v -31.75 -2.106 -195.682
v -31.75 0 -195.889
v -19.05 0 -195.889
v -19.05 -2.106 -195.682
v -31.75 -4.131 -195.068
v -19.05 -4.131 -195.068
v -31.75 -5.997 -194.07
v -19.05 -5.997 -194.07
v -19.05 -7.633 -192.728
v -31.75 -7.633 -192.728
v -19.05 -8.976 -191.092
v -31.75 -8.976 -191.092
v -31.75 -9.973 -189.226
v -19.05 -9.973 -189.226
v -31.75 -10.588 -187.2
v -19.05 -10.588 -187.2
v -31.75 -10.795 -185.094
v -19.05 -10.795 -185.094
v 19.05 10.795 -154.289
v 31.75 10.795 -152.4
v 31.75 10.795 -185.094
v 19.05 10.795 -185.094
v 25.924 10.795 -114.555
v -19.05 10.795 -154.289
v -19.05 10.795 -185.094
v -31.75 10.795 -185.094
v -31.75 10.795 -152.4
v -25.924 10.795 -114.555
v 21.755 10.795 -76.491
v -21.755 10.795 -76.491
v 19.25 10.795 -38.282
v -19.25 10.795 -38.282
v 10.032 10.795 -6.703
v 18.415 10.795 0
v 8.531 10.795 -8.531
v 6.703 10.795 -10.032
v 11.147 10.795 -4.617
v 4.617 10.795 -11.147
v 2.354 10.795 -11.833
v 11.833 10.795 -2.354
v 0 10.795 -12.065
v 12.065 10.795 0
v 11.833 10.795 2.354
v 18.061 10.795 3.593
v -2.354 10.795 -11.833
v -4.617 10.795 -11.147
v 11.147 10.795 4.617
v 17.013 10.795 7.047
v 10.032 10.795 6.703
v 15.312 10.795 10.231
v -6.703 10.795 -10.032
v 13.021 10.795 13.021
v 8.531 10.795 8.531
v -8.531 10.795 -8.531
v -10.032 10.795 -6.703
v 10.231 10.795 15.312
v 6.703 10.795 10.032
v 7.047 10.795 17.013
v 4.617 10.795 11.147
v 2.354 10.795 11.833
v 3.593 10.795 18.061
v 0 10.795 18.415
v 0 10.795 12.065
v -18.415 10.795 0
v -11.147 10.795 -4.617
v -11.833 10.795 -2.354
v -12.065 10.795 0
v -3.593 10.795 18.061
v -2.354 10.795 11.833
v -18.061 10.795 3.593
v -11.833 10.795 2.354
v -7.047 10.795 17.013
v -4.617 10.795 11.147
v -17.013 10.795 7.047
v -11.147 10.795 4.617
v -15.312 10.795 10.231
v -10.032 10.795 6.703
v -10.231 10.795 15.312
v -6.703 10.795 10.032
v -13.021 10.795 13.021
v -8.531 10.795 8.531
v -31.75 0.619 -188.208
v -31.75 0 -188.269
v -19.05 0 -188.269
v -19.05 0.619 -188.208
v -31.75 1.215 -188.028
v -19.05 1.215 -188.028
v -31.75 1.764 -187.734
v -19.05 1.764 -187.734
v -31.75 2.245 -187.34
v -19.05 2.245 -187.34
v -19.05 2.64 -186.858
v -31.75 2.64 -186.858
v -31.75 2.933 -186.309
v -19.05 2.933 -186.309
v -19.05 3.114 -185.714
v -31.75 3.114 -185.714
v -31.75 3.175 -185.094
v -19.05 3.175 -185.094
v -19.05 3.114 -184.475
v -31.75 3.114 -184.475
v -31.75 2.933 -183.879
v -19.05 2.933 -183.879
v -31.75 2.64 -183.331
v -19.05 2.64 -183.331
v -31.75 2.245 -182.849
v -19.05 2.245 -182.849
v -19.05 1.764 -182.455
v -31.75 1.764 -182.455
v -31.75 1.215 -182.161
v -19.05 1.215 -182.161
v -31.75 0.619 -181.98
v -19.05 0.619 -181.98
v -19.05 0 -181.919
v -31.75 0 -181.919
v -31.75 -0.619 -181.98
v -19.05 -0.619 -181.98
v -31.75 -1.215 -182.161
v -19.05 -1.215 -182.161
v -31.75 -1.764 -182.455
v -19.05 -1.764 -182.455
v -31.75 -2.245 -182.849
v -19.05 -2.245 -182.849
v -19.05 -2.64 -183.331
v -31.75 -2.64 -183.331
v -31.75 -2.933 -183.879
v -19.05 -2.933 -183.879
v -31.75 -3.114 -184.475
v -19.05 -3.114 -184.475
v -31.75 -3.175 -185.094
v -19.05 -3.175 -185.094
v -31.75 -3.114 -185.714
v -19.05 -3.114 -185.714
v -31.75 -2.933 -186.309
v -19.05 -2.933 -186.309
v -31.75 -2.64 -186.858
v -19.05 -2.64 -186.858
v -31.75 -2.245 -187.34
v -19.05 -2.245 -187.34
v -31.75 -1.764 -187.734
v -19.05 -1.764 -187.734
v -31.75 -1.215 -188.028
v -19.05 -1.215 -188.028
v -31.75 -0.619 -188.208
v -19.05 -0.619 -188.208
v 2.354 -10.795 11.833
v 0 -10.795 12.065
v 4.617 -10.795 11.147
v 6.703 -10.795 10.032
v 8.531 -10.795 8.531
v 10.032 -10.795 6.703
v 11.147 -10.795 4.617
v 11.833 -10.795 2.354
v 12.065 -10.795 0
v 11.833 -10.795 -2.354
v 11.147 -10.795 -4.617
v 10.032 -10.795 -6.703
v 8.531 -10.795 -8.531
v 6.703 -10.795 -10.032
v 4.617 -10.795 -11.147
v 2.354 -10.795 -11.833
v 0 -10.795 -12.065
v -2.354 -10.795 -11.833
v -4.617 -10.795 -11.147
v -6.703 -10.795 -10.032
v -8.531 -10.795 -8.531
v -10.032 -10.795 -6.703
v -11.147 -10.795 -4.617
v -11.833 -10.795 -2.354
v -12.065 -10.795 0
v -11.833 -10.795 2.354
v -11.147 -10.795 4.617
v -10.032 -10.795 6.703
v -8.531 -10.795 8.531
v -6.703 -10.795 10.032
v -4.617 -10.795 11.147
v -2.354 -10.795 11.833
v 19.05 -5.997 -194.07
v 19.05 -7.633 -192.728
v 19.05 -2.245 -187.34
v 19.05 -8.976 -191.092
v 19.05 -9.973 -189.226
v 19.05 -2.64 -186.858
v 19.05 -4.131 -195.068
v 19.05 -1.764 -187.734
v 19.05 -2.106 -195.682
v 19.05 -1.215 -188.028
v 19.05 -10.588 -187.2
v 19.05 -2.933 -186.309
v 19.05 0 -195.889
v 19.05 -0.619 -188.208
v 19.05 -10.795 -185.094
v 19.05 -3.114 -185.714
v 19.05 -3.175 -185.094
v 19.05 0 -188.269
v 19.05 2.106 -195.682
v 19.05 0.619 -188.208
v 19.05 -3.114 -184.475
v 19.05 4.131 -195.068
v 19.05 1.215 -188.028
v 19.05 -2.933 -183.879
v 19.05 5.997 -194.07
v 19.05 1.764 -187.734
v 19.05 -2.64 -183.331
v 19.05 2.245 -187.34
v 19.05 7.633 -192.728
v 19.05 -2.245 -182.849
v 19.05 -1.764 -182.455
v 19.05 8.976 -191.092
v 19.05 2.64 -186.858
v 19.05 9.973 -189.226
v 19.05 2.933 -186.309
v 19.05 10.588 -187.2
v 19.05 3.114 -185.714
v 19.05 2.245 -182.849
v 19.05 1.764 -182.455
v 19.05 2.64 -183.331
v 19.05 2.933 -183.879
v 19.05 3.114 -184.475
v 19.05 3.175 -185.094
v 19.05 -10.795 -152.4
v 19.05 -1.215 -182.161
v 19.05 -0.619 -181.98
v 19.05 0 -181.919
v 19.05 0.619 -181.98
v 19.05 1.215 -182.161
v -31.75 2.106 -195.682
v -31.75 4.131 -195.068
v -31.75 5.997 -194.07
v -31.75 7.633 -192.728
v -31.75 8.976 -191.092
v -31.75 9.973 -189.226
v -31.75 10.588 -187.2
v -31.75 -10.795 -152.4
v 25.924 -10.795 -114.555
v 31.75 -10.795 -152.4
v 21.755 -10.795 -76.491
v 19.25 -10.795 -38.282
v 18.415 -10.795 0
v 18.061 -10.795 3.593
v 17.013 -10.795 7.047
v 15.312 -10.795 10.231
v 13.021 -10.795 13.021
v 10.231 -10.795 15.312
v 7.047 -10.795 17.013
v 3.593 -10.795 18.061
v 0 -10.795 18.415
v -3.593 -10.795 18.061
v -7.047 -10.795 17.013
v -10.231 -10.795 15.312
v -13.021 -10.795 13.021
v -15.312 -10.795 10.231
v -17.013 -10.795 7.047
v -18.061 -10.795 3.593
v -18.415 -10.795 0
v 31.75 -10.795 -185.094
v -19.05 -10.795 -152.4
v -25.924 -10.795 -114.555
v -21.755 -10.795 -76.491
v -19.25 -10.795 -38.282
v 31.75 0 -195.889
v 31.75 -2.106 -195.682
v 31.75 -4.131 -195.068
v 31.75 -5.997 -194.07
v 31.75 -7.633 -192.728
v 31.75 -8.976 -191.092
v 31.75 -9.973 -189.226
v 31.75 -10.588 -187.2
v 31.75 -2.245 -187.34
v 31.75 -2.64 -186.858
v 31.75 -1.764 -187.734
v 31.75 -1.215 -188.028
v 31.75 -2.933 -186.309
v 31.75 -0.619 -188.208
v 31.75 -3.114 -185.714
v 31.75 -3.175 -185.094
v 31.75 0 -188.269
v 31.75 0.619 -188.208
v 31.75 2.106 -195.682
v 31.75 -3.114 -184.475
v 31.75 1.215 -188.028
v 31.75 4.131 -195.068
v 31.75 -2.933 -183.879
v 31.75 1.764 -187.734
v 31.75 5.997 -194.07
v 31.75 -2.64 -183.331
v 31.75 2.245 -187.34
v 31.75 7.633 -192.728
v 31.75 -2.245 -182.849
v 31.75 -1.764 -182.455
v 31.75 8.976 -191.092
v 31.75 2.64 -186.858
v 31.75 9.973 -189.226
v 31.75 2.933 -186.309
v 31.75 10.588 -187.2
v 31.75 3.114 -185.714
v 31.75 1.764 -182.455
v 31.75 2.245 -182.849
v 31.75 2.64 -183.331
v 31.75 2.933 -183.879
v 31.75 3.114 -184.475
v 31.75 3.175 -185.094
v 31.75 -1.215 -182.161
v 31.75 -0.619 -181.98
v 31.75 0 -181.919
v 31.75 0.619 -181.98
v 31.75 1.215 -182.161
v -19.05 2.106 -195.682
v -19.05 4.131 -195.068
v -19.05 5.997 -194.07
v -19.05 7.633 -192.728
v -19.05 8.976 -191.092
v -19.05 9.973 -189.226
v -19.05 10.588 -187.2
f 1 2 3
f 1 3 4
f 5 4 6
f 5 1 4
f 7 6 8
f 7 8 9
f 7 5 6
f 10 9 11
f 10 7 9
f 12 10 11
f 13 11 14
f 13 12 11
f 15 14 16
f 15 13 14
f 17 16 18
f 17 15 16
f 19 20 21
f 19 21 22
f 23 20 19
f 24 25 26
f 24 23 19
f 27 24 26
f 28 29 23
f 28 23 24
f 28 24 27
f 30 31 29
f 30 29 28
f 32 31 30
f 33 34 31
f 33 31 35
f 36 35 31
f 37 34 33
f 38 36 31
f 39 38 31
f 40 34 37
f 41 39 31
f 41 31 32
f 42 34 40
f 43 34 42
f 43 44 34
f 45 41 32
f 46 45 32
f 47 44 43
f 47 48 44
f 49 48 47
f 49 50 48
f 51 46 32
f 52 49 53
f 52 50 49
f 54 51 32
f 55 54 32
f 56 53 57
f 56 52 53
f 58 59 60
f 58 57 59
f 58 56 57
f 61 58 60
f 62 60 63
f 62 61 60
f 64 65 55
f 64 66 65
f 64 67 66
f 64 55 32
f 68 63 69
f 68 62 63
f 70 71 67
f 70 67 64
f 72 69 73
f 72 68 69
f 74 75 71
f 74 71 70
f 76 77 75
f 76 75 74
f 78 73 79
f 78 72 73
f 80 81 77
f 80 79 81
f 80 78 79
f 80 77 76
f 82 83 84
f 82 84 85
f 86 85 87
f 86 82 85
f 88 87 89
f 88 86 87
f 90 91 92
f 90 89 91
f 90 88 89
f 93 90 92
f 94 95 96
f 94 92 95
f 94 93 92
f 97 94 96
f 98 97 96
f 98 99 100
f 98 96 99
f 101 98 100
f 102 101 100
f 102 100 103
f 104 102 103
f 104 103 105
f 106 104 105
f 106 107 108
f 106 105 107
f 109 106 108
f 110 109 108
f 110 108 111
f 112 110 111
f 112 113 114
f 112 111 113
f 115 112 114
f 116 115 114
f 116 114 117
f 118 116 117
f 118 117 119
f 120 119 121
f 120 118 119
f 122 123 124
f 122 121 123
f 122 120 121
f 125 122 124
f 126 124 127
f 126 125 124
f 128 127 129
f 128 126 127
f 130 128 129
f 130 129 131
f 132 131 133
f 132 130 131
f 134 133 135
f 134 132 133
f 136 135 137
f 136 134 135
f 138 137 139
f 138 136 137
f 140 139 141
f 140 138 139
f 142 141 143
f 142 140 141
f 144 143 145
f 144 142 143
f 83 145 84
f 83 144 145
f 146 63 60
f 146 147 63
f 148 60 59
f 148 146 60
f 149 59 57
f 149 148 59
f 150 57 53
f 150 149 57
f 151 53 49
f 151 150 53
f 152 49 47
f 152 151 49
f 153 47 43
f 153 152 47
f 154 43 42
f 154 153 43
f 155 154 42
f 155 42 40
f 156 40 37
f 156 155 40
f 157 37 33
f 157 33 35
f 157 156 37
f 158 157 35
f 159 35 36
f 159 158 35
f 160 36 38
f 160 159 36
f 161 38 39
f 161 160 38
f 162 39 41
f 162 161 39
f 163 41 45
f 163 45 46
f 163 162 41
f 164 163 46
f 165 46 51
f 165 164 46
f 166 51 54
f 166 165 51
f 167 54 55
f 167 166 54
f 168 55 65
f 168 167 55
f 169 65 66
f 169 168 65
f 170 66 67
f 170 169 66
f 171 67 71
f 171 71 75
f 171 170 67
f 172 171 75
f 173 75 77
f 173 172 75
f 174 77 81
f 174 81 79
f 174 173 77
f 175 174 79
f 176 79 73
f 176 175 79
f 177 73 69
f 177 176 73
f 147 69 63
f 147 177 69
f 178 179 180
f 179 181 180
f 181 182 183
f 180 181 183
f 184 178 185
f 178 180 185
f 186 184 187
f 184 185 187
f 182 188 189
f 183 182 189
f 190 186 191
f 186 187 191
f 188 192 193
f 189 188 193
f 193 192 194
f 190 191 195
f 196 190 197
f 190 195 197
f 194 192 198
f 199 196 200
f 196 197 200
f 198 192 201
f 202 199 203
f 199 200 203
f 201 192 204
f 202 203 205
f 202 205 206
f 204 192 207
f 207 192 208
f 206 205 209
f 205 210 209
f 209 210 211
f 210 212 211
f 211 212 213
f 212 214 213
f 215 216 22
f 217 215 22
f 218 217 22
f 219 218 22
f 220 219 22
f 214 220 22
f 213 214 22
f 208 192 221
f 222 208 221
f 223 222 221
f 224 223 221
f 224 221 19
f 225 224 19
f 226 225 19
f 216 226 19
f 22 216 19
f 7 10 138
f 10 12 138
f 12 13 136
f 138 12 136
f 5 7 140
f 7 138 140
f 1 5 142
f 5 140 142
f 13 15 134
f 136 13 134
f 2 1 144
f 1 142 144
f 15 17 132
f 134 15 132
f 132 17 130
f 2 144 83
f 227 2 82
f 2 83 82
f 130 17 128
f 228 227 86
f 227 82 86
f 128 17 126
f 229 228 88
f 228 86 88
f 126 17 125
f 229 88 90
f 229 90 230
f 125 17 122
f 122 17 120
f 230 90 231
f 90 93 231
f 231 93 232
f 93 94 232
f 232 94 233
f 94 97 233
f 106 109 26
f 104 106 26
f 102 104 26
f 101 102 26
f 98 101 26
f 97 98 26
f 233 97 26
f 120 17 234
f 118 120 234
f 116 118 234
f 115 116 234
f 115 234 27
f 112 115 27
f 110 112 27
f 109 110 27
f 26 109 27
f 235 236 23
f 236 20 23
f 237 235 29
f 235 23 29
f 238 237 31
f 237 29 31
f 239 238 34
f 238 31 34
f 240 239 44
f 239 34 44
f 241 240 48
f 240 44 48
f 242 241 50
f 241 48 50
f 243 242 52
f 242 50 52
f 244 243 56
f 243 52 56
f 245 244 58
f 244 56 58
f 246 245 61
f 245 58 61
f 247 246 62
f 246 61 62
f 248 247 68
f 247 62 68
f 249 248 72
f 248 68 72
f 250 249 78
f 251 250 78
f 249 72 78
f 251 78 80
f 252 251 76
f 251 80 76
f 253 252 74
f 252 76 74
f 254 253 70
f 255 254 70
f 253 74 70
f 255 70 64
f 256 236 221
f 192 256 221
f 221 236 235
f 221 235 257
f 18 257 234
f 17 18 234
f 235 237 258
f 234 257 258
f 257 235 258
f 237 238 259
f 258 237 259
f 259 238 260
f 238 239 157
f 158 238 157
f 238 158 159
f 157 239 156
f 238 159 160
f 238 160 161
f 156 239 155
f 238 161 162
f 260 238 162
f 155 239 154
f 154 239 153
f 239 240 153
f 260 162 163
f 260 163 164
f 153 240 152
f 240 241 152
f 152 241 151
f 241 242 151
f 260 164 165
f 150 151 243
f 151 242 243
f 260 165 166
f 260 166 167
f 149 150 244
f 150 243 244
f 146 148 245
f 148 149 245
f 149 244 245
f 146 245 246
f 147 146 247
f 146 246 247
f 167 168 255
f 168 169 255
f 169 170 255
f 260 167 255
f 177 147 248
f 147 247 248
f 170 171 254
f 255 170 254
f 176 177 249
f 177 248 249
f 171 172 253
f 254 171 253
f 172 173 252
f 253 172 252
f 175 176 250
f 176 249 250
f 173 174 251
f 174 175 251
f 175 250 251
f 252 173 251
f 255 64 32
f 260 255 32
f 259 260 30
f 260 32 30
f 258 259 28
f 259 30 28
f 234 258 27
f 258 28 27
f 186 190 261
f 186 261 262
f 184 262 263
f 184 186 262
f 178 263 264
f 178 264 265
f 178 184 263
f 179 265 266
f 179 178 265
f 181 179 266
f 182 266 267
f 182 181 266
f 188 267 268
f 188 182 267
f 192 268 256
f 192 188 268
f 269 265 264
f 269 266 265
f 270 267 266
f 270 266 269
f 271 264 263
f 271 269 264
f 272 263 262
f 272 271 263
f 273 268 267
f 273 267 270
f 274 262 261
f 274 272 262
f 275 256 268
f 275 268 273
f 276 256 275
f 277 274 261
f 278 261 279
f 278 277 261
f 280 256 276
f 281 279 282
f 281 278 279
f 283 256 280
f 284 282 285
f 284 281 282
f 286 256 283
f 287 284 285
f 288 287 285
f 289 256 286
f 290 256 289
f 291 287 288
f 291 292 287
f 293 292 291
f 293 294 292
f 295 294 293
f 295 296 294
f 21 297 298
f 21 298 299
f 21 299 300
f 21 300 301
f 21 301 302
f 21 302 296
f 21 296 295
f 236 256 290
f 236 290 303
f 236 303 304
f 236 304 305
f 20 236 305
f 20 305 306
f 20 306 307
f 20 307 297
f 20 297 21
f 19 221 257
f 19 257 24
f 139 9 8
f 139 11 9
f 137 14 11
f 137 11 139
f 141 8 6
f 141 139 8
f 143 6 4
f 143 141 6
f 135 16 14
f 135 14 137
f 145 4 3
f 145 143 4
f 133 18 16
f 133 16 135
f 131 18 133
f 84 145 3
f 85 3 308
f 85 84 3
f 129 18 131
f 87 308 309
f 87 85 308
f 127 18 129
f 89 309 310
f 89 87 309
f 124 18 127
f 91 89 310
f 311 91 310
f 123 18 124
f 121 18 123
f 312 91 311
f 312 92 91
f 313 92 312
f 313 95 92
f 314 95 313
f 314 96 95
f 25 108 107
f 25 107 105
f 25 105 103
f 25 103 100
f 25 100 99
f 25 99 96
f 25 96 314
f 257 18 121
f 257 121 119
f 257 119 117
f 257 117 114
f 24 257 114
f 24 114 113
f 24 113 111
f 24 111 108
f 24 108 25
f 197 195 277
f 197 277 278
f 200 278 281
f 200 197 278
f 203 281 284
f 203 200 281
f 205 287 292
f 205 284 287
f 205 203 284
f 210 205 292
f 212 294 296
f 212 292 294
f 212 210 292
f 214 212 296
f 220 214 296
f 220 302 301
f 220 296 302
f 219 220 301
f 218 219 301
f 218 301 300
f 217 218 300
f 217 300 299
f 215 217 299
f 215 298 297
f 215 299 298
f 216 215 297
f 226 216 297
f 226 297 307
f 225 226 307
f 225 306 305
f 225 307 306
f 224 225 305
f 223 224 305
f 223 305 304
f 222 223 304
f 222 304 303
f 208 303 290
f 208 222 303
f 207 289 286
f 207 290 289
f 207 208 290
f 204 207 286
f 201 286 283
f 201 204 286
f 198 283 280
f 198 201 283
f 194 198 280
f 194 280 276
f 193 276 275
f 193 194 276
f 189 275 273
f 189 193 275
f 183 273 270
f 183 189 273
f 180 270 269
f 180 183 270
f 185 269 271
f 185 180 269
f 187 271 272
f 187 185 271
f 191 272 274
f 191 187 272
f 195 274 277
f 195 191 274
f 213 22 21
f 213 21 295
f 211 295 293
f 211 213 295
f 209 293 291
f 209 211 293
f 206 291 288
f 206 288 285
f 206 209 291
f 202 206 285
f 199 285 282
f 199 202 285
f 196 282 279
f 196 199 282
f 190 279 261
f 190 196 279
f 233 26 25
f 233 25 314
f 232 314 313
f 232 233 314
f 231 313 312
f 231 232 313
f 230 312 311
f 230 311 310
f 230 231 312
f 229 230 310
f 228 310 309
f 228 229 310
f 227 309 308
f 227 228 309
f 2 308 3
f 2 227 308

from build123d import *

# Parameters (mm, degrees)
SKETCH1_R               = 12.065
BOSS_EXTRUDE1_DEPTH     = 10.795
SKETCH5_W               = 38.1
SKETCH5_H               = 21.59
BOSS_EXTRUDE2_DEPTH     = 101.6
CUT_EXTRUDE1_REACH      = 261.255
SKETCH6_R               = 3.175
SKETCH4_W               = 12.7
SKETCH4_H               = 21.59
BOSS_EXTRUDE3_DEPTH     = 50.8
CUT_EXTRUDE2_DEPTH      = 210.73176208
CUT_EXTRUDE2_DEPTH_BACK = 210.73176208
SKETCH6_2_R             = 3.175
CUT_EXTRUDE3_DEPTH      = 214.164307578
CUT_EXTRUDE3_DEPTH_BACK = 214.164307578


with BuildPart() as part:
    # Sketch1 → Boss-Extrude1 (new, symmetric)
    with BuildSketch(Plane(origin=(0, 0, 0), x_dir=(1, 0, 0), z_dir=(0, 1, 0))):
        with BuildLine():
            Line((-31.75, 152.4), (31.75, 152.4))
            ThreePointArc((31.75, 152.4), (21.755106695, 76.491146914), (18.415, 0))
            ThreePointArc((18.415, 0), (0, -18.415), (-18.415, 0))
            ThreePointArc((-18.415, 0), (-21.755106695, 76.491146914), (-31.75, 152.4))
        make_face()
        Circle(SKETCH1_R, mode=Mode.SUBTRACT)
    extrude(amount=BOSS_EXTRUDE1_DEPTH, both=True)

    # Sketch5 → Boss-Extrude2 (add)
    with BuildSketch(Plane(origin=(0, 0, -152.4), x_dir=(-1, 0, 0), z_dir=(0, 0, -1))):
        Rectangle(SKETCH5_W, SKETCH5_H)
    extrude(amount=BOSS_EXTRUDE2_DEPTH)

    # Sketch6 → Cut-Extrude1 (cut, up to next)
    with BuildSketch(Plane(origin=(19.05, 0, 0), x_dir=(0, 0, -1), z_dir=(1, 0, 0)), mode=Mode.PRIVATE) as cut_extrude1_sk1:
        Polygon((152.4, -10.795), (154.288880246, 10.795), (254, 10.795), (254, -10.795), align=None)
        with Locations((185.094440123, 0)):
            Circle(SKETCH6_R, mode=Mode.SUBTRACT)
    cut_extrude1_tool1 = extrude(cut_extrude1_sk1.sketch, amount=-CUT_EXTRUDE1_REACH, mode=Mode.PRIVATE) & part.part
    add(cut_extrude1_tool1.solids().sort_by_distance((19.05, -0.034262, -203.945458))[0], mode=Mode.SUBTRACT)


with BuildPart() as cut_extrude1_piece_1:
    # of the separate pieces the step leaves, piece 1, a body of its own (cut_extrude1_pieces)
    add(part.part.solids().sort_by_distance((-31.75, -10.795, -152.4))[0])

    # Sketch4 → Boss-Extrude3 (add)
    with BuildSketch(Plane(origin=(0, 0, -152.4), x_dir=(-1, 0, 0), z_dir=(0, 0, -1))):
        with Locations((-25.4, 0)):
            Rectangle(SKETCH4_W, SKETCH4_H)
        with Locations((25.4, 0)):
            Rectangle(SKETCH4_W, SKETCH4_H)
    extrude(amount=BOSS_EXTRUDE3_DEPTH)


with BuildPart() as cut_extrude1_piece_2:
    # of the separate pieces the step leaves, piece 2, a body of its own (cut_extrude1_pieces)
    add(part.part.solids().sort_by_distance((-19.05, 0, -188.269440123))[0])


with BuildPart() as cut_extrude2_tool:
    # Sketch6<2> → Cut-Extrude2 (new, two sides: drawn at the far end of the back side and taken through both)
    with BuildSketch(Plane(origin=(19.05, 0, 0), x_dir=(0, 0, -1), z_dir=(1, 0, 0)).offset(-CUT_EXTRUDE2_DEPTH_BACK)):
        with Locations((185.094440123, 0)):
            Circle(SKETCH6_2_R)
    extrude(amount=CUT_EXTRUDE2_DEPTH + CUT_EXTRUDE2_DEPTH_BACK)


with BuildPart() as cut_extrude1_piece_1_1:
    add(cut_extrude1_piece_1.part)

    # Cut-Extrude2: cut by cut_extrude2_tool
    add(cut_extrude2_tool.part, mode=Mode.SUBTRACT)

    # Sketch7 → Cut-Extrude3 (cut, two sides: drawn at the far end of the back side and taken through both)
    with BuildSketch(Plane(origin=(31.75, 0, 0), x_dir=(0, 0, -1), z_dir=(1, 0, 0)).offset(-CUT_EXTRUDE3_DEPTH_BACK)):
        with BuildLine():
            Line((203.2, 10.795), (185.094440123, 10.795))
            ThreePointArc((185.094440123, 10.795), (192.727657826, 7.633217703), (195.889440123, 0))
            ThreePointArc((195.889440123, 0), (192.727657826, -7.633217703), (185.094440123, -10.795))
            Line((185.094440123, -10.795), (203.2, -10.795))
            Line((203.2, -10.795), (203.2, 10.795))
        make_face()
    extrude(amount=CUT_EXTRUDE3_DEPTH + CUT_EXTRUDE3_DEPTH_BACK, mode=Mode.SUBTRACT)


with BuildPart() as cut_extrude1_piece_2_1:
    add(cut_extrude1_piece_2.part)

    # Cut-Extrude2: cut by cut_extrude2_tool
    add(cut_extrude2_tool.part, mode=Mode.SUBTRACT)


solid = cut_extrude1_piece_1_1.part
